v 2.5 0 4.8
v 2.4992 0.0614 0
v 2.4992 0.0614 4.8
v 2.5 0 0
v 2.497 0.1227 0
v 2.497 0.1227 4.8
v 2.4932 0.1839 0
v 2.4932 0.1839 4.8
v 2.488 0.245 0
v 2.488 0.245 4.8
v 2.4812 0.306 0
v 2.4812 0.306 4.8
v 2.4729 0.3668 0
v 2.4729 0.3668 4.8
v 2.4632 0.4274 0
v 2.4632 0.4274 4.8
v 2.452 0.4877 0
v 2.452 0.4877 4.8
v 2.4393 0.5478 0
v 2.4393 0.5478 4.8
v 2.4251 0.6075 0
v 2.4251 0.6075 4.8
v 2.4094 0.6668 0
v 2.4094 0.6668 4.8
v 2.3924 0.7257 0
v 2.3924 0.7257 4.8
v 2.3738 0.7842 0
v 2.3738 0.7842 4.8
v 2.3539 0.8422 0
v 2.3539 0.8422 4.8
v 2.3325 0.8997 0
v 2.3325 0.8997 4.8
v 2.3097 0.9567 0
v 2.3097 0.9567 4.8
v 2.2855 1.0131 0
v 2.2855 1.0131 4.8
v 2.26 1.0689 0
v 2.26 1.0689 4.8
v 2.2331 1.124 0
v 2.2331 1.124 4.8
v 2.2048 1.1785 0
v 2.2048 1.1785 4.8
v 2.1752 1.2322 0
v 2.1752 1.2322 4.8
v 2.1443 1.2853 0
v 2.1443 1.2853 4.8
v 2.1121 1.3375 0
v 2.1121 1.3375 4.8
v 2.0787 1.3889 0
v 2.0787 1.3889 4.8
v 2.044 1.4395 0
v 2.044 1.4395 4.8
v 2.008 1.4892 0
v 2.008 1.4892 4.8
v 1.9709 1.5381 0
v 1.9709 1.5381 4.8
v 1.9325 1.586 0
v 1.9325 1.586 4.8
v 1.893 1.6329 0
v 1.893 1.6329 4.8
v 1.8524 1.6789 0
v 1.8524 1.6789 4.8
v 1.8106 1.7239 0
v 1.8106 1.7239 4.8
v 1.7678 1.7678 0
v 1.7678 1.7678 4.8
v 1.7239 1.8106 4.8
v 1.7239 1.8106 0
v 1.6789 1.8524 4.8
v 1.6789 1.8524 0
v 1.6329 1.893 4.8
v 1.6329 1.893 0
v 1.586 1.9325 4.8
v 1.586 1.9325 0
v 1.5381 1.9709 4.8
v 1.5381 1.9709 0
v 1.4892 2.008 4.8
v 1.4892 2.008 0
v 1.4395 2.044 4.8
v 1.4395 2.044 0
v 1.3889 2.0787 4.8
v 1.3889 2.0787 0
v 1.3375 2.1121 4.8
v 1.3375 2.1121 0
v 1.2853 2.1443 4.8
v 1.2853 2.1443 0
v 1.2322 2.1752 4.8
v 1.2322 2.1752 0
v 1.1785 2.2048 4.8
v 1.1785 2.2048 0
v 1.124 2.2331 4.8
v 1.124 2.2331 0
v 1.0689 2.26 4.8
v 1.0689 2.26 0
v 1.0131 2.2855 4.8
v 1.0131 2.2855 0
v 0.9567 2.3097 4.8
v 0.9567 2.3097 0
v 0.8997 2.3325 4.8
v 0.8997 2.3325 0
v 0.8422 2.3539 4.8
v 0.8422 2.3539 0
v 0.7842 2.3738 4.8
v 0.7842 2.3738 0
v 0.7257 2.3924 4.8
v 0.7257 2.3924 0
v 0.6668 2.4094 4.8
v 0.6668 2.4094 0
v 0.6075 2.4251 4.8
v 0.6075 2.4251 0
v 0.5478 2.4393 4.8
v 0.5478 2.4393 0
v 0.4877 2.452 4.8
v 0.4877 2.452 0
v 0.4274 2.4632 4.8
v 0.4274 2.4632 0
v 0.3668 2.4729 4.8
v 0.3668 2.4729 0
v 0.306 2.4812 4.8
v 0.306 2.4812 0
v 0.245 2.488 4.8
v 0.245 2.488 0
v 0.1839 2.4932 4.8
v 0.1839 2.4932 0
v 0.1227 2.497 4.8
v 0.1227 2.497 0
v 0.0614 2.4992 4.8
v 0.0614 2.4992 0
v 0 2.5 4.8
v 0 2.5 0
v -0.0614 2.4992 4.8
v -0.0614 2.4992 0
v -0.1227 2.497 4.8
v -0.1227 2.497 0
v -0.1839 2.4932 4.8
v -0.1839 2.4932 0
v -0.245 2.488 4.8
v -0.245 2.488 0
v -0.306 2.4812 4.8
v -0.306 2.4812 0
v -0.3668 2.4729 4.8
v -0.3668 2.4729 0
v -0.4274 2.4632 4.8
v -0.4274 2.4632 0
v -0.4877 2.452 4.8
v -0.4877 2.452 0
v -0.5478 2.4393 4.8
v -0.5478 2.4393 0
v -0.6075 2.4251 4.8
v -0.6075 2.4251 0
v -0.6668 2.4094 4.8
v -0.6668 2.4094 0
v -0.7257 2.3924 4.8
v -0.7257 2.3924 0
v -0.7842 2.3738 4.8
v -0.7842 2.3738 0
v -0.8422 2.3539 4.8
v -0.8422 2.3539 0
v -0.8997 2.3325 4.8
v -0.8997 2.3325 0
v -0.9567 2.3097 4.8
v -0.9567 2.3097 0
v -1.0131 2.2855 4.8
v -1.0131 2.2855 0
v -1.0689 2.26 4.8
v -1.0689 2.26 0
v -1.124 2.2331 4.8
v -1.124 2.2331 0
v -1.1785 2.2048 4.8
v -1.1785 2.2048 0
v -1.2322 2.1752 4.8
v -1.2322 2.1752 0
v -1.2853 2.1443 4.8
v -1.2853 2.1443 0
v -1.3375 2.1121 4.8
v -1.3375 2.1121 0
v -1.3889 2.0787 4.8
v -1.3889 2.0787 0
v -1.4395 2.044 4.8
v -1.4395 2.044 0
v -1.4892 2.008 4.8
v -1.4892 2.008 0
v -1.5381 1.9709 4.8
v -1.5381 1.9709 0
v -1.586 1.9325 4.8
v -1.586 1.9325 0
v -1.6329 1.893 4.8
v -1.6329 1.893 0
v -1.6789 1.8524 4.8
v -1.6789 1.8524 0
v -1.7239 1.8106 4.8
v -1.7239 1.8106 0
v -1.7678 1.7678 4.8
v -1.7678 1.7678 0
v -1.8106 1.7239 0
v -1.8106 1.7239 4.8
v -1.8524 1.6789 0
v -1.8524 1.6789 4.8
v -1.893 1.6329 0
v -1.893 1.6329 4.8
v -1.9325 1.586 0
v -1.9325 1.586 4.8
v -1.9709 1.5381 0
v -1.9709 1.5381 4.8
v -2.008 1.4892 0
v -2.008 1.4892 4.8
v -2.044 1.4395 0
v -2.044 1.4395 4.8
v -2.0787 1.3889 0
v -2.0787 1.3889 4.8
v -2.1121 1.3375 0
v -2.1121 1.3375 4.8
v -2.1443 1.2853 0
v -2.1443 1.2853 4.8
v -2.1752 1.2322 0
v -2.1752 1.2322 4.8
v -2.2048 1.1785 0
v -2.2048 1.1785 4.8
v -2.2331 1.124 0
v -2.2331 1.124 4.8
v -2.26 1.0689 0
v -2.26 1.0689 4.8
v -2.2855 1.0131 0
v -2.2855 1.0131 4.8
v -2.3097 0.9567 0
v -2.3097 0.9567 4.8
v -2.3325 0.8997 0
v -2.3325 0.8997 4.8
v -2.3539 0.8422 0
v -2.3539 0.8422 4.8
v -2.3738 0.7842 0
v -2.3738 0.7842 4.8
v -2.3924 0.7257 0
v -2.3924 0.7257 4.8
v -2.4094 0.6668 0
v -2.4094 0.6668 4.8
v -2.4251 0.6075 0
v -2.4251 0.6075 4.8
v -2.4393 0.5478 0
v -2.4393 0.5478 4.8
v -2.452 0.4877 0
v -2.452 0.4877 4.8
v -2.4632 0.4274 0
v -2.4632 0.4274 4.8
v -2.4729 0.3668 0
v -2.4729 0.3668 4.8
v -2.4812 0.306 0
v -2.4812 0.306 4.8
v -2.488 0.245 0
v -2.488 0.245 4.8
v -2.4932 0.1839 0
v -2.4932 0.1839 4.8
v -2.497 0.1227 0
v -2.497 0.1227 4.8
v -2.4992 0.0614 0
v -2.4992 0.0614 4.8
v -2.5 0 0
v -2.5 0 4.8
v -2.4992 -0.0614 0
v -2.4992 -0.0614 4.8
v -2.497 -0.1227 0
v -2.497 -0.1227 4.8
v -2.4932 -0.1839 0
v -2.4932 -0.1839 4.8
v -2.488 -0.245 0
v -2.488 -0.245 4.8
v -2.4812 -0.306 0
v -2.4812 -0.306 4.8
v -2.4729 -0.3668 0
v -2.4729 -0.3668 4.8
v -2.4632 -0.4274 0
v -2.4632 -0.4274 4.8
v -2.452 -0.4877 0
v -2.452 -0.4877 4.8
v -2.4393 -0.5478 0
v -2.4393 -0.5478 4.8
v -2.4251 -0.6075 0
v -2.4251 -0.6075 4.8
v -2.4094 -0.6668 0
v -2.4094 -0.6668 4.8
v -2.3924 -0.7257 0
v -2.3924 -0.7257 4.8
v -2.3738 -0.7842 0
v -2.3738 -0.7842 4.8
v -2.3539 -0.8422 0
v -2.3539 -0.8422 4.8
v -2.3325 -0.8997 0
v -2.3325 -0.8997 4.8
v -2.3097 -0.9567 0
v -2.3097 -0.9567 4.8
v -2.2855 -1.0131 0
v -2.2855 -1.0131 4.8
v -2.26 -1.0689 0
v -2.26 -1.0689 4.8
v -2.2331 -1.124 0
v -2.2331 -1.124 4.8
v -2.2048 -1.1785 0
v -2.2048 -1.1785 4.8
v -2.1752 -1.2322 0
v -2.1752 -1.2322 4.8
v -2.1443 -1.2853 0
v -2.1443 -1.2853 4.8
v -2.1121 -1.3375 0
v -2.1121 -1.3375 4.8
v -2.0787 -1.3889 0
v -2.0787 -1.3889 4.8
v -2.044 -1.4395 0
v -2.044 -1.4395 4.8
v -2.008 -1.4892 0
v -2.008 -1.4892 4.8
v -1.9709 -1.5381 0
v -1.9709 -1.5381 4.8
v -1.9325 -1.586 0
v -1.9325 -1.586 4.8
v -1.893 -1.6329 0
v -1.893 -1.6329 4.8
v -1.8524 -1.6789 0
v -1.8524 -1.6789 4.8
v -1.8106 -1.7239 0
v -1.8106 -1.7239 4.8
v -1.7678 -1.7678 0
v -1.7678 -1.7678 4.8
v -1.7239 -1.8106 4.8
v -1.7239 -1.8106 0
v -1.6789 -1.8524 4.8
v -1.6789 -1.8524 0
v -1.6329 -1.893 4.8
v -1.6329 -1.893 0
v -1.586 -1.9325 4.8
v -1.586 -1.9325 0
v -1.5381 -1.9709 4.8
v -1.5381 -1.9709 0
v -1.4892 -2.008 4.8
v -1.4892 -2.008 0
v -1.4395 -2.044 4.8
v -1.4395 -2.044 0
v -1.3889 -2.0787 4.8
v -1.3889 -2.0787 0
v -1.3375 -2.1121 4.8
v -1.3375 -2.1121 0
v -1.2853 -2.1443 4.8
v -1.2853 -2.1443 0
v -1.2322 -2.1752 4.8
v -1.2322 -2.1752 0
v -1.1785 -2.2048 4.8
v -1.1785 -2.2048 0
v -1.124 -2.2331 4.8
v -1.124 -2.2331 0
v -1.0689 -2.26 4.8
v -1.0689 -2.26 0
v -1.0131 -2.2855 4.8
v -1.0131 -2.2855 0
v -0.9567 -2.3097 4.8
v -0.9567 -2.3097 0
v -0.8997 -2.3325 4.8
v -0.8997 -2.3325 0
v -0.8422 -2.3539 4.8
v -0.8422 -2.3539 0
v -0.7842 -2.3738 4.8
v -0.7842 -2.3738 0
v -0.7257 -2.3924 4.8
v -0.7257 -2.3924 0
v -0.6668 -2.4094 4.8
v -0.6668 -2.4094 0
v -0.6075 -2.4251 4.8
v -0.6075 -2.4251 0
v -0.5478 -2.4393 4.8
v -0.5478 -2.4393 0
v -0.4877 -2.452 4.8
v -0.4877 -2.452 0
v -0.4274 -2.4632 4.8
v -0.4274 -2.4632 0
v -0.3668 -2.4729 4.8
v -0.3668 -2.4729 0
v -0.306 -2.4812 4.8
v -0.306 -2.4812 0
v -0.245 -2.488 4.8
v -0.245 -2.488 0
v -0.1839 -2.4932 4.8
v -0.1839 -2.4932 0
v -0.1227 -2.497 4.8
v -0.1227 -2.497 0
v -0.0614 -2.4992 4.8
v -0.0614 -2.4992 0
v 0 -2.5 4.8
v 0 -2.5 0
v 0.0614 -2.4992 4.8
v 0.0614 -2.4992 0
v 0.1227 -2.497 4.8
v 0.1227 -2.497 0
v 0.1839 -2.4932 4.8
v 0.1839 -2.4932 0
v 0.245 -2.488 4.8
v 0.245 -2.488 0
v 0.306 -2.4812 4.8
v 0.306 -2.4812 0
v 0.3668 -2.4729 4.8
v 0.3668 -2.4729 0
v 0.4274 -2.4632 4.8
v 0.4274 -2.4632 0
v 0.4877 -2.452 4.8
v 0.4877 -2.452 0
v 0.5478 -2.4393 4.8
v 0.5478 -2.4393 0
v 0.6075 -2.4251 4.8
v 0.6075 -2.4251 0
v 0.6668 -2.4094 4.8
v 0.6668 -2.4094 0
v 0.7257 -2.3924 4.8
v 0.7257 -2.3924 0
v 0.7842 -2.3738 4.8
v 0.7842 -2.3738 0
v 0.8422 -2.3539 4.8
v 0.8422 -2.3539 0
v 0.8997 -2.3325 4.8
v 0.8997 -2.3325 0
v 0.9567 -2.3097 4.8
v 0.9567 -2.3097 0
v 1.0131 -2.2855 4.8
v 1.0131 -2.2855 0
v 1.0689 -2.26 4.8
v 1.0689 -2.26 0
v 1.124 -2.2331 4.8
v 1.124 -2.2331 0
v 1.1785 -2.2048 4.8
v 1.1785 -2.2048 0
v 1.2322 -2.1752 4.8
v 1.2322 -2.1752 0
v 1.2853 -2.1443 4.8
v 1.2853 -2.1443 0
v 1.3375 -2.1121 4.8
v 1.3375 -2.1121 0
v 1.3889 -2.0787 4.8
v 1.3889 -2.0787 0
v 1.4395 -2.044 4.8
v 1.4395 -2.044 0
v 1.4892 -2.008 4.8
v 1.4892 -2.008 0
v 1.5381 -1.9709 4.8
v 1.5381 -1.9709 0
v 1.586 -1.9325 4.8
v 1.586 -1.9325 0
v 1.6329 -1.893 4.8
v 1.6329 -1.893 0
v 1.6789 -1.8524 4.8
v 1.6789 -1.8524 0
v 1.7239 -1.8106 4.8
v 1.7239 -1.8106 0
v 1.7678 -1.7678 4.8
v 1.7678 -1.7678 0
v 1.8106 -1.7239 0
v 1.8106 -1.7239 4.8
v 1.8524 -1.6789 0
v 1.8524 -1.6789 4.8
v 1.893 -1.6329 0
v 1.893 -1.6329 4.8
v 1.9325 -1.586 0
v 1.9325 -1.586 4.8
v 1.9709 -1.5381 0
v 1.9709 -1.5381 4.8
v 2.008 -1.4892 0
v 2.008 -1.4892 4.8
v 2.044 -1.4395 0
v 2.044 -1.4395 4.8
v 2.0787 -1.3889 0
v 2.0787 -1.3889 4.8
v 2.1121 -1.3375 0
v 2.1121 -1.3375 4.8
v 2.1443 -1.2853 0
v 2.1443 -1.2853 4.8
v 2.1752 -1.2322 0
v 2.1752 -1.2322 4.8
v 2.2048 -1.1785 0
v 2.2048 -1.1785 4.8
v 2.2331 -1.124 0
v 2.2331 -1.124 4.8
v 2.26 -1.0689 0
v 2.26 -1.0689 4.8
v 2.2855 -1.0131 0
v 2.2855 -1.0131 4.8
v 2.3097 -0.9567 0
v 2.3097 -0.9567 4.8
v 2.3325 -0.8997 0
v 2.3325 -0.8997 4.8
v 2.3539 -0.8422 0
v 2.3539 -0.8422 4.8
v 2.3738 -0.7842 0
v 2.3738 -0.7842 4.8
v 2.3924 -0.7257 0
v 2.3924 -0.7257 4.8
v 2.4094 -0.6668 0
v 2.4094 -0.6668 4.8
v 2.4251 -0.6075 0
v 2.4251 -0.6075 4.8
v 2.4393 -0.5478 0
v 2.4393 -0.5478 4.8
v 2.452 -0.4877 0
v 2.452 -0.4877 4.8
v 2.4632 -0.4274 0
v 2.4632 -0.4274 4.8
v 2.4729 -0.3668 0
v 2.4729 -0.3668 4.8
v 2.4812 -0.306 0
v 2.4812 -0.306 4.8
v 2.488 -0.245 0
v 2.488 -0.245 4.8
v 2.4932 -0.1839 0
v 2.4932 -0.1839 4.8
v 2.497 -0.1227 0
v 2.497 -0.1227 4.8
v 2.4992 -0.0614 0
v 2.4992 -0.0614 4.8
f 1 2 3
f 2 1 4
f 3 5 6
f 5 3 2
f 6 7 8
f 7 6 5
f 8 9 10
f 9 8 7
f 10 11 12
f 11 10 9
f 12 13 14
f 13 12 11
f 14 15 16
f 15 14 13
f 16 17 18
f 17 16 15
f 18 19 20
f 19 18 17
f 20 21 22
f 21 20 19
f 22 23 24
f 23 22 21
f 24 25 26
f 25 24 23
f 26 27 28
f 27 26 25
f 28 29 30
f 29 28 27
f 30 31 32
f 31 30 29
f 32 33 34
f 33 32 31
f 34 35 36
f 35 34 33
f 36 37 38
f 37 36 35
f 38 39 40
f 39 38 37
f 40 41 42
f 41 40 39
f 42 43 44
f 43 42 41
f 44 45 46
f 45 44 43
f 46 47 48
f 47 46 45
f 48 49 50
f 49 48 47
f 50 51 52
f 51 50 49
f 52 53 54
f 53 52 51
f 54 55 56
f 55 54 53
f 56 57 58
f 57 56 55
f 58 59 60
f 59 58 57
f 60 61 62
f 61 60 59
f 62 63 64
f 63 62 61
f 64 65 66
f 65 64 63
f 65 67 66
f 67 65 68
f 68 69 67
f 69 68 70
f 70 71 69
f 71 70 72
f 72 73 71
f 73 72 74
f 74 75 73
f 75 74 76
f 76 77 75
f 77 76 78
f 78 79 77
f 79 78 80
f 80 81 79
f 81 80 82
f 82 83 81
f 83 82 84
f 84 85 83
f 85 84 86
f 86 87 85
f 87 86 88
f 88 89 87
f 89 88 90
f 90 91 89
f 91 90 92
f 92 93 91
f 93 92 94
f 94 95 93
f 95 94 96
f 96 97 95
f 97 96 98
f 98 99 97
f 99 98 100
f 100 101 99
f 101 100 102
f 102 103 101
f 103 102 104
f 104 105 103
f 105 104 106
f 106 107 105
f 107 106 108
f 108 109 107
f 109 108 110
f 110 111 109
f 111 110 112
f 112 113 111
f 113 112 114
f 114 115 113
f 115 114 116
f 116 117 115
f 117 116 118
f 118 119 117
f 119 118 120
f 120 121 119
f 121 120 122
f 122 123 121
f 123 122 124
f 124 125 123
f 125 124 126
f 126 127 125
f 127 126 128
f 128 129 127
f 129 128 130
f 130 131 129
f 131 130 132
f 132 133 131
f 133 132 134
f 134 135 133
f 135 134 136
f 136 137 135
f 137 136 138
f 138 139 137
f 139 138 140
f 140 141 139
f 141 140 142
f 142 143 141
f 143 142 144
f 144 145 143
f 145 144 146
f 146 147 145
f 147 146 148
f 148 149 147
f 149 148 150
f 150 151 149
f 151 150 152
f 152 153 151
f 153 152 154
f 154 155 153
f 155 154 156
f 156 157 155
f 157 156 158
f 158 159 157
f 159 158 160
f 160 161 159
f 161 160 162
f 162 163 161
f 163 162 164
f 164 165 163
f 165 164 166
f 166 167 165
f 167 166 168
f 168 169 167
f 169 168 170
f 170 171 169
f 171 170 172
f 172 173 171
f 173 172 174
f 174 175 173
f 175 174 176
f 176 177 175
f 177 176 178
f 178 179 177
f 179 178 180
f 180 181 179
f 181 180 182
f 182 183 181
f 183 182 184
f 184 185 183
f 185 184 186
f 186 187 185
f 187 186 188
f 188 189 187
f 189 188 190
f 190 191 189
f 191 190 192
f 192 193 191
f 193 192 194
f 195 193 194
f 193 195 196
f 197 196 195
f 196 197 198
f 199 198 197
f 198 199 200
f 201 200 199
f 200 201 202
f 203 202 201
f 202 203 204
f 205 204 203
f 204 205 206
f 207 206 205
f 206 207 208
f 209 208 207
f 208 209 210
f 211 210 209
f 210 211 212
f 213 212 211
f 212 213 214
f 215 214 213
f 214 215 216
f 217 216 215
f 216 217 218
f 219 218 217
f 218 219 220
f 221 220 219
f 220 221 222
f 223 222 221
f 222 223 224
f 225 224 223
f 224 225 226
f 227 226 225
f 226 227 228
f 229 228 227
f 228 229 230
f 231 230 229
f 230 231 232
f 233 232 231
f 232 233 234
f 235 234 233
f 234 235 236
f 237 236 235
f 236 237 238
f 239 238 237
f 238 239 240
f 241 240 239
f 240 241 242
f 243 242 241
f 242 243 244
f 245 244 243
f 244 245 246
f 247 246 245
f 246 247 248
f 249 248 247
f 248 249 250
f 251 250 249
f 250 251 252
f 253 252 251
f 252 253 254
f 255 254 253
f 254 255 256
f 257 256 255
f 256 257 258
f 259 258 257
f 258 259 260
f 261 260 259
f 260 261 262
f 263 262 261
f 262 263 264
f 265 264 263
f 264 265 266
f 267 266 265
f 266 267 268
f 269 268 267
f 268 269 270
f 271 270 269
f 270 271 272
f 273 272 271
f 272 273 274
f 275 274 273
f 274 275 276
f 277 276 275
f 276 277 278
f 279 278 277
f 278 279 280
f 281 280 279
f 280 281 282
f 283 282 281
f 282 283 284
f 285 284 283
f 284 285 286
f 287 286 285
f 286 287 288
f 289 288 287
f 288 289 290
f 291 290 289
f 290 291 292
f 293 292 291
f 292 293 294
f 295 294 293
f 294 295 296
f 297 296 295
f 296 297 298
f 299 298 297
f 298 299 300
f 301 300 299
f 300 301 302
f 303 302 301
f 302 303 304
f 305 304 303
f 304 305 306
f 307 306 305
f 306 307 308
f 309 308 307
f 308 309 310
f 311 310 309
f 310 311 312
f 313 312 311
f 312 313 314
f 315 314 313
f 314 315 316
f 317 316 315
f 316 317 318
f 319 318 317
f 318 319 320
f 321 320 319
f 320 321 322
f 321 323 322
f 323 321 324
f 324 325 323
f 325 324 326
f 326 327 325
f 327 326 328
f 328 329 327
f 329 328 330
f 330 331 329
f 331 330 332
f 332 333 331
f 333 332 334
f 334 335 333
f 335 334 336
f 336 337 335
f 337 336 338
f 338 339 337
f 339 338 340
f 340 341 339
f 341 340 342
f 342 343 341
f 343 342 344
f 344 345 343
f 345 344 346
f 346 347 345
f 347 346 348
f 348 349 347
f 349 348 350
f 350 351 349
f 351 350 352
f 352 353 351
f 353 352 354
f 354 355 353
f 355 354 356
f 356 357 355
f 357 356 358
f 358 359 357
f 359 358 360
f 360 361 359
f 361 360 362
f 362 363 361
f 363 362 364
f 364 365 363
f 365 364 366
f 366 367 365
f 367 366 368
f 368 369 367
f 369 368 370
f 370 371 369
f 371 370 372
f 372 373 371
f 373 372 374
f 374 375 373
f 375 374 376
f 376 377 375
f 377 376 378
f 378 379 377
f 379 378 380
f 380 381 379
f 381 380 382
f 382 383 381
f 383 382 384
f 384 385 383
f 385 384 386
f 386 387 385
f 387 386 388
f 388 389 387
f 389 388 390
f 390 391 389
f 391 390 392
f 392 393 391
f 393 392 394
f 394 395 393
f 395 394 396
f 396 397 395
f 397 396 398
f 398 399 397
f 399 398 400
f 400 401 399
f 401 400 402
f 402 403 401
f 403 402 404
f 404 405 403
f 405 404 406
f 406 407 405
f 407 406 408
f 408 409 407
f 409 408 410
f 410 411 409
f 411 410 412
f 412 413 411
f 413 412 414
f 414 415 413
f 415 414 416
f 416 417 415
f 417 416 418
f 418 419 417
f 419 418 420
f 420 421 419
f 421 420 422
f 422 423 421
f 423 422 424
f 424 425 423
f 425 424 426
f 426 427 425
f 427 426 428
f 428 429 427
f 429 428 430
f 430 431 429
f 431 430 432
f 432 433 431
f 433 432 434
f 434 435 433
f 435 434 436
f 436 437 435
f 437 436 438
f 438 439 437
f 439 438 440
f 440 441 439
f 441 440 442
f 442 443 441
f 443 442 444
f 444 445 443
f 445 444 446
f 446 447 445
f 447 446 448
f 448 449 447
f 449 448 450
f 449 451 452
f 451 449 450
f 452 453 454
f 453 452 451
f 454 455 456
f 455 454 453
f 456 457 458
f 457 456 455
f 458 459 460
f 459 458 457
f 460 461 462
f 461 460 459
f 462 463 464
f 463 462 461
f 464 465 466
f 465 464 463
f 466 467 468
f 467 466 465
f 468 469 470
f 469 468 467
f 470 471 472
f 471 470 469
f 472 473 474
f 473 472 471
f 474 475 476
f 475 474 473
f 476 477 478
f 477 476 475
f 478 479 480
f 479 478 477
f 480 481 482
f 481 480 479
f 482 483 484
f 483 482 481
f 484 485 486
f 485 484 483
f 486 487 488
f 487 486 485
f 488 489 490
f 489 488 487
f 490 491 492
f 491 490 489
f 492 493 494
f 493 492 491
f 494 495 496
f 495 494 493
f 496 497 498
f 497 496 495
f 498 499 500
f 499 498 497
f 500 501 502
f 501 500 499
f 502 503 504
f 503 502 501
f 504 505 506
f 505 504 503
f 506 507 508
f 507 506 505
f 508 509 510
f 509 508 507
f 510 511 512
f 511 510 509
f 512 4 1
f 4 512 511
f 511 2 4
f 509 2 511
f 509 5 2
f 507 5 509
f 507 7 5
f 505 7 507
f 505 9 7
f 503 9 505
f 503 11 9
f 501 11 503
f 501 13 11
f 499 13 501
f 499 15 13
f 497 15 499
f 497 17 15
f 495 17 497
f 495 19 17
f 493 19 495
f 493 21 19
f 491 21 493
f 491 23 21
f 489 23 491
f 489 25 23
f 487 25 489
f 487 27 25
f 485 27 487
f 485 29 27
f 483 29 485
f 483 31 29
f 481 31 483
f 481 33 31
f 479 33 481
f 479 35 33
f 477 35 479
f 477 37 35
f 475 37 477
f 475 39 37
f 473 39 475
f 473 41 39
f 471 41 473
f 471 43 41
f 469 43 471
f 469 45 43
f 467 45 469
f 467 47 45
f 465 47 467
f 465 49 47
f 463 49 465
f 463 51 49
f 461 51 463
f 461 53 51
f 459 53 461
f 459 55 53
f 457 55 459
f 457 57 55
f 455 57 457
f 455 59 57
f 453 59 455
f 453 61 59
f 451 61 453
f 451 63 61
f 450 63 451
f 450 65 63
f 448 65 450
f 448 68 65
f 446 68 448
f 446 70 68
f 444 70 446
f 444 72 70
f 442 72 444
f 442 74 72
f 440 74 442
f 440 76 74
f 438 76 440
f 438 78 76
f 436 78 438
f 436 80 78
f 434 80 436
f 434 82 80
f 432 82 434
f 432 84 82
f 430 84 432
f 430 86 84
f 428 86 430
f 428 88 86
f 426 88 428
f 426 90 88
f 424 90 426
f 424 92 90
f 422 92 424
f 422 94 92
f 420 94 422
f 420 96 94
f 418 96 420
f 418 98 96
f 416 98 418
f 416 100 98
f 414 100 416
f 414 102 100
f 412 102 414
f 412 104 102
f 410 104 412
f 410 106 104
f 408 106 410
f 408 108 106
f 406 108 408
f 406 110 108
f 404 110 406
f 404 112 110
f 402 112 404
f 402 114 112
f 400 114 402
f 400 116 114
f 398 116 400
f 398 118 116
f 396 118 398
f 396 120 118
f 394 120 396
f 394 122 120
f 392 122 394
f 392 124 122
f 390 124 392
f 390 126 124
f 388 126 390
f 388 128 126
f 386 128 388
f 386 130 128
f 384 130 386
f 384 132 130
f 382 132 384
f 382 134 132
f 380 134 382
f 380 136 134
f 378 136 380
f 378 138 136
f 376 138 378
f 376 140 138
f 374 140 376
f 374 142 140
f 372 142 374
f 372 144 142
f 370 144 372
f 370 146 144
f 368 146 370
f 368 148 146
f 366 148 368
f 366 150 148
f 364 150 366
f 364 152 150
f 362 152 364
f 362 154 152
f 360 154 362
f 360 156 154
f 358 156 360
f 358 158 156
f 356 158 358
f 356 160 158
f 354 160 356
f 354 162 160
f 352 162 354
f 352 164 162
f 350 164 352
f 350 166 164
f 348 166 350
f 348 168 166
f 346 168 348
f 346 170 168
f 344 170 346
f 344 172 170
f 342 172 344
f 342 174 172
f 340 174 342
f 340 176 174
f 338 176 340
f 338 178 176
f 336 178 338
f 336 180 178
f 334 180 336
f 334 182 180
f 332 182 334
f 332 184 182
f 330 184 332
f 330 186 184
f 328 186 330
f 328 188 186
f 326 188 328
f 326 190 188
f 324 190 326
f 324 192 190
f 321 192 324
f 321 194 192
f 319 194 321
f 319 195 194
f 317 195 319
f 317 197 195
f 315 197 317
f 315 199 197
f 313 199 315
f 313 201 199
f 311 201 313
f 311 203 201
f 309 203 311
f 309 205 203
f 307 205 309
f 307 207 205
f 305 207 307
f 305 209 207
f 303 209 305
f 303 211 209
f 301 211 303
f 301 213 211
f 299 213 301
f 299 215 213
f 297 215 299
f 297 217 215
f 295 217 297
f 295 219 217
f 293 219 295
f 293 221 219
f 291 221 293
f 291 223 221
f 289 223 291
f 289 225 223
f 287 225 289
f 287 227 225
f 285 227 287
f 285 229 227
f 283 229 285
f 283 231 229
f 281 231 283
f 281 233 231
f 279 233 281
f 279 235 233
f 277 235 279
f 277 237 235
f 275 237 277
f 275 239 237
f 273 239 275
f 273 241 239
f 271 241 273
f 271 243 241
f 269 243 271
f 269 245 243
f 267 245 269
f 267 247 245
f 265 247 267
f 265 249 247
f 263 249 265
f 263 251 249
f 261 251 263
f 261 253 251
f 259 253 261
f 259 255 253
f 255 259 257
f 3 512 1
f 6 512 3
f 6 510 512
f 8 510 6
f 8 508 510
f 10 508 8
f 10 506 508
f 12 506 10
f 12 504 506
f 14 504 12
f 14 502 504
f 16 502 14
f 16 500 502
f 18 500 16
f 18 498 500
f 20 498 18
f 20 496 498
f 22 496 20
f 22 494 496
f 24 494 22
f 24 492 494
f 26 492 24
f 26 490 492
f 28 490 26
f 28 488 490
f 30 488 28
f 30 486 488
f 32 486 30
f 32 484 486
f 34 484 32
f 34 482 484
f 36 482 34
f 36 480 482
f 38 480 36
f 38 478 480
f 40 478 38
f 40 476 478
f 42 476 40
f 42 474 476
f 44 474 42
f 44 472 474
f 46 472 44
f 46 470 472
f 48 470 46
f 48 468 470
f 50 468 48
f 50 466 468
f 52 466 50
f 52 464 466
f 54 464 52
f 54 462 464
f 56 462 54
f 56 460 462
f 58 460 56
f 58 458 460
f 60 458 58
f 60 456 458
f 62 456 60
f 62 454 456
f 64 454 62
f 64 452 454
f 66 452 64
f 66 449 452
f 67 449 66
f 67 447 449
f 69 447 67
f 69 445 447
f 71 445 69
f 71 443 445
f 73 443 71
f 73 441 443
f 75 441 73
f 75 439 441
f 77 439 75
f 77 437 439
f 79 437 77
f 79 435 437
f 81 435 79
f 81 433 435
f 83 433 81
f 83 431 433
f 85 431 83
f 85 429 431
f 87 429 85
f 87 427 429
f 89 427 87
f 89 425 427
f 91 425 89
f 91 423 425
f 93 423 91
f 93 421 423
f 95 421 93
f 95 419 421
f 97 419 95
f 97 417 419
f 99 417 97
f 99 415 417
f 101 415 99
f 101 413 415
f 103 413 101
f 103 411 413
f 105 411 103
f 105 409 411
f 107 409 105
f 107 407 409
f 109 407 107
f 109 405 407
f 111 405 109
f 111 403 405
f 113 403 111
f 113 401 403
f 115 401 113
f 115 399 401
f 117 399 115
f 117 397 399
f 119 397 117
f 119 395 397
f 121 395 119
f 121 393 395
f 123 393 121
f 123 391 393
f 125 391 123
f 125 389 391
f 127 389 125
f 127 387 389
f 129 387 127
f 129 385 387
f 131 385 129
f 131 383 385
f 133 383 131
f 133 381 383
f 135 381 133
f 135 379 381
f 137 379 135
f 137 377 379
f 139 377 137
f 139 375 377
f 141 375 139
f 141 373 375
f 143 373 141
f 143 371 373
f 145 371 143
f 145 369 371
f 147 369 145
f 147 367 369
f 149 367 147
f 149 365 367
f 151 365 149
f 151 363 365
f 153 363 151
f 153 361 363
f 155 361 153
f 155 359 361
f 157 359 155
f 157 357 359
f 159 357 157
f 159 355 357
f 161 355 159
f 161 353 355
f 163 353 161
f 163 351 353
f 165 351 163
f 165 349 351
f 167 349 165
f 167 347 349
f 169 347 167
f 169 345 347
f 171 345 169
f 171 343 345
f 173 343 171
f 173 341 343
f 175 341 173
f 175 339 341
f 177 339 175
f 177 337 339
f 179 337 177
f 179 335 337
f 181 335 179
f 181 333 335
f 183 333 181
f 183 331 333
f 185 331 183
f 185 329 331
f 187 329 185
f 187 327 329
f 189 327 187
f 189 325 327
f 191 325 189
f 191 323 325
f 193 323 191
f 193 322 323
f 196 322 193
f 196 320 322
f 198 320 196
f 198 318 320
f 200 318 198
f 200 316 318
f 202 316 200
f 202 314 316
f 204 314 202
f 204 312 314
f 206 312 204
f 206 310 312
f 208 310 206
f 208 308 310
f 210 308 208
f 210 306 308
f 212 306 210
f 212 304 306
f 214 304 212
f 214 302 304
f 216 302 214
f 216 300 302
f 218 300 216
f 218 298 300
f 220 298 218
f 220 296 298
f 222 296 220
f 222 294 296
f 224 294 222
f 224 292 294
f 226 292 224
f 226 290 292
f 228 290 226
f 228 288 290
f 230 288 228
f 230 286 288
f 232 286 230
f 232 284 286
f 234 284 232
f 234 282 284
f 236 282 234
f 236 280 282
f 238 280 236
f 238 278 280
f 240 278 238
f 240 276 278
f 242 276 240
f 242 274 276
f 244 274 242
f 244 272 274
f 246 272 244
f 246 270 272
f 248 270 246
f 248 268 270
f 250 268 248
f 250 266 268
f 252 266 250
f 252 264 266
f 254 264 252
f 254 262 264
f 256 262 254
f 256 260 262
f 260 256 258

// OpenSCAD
$fn=256;

// z = depth
// x = wdith
// y = length

nozzelDiameter = 0.4;
wallThickness = nozzelDiameter * 6;

inchesToMmRatio = 25.4;

wellRadius = 5;

totalLength = (11.5 * inchesToMmRatio) / 2;

// totalLength = (11.5 / 4) * inchesToMmRatio;

totalWidth = 2.5 * inchesToMmRatio;
totalHeight = 1.5 * inchesToMmRatio;

slopeDepth = 0.5 * inchesToMmRatio;
slopeHeight = totalHeight;

numberOfCells = 2;
numberOfWalls = numberOfCells + 1;
numberOfSeperatorWalls = numberOfWalls - 2;

cellWidth = totalWidth - 2 * wallThickness;
cellLength = (totalLength - (numberOfWalls * wallThickness)) / numberOfCells;

module prusamain() {
    difference() {
        union(){
            trayFloor();
            perimeter();
            wellFillet(wellRadius);
            dividerWalls();
            wellFillet2();
        }
        pinHoles();
    }
}


module dividerWalls() {
    for (i = [1:numberOfSeperatorWalls]) {
        yOffset = wallThickness + (i * cellLength);
        translate([ 0, yOffset, 0]) {
            widthWall();
        } 
    }
}

pin();

pinDiameter = 5;
pinHeight = 2 * wallThickness;
pinOffset= 2 * pinDiameter;

module pin() {
  cylinder(h = pinHeight, r = (pinDiameter / 2));
}

module pinHoles() {

    translate(v = [pinOffset, wallThickness + 1, pinOffset]) {
        pinHole();
    }


    translate(v = [totalWidth - pinOffset, wallThickness + 1, totalHeight - pinOffset]) {
        pinHole();
    }

}

module pinHole() {
    rotate([90,0,0]) { 
    cylinder(h = wallThickness + 2, r = ((pinDiameter + 1) / 2));
    }
}


module wellFillet(r=10) {
    translate([0,totalLength / 2, 0])  {
        rotate([90,0,0]) {
            filletEdge(totalLength, r, wallThickness);
        } 
    }
}


module wellFillet2() {
    translate([totalWidth, 0,0]) { 
        mirror([1,0,0]) {

            translate([0,totalLength / 2, 0])  {
                rotate([90,0,0]) {
                    filletEdge2(
                        l = totalLength,
                        r = slopeDepth,
                        w = wallThickness,
                        h = totalHeight
                    );
                }
            }
        }
    }
}



module filletEdge(l = 10, r = 2, w = 1) {

    cubeSide = r + w;

    translate([w, w, 0]) {
        
        difference() {
            
            translate([cubeSide / 2 - w, cubeSide / 2  - w, 0]) {
                cube(size=[cubeSide, cubeSide, l], center=true);
            }

            translate([r, r, 0]) {
                cylinder(l, r, r, true);   
            }

        }


    }
}

// l = length
// r = radius
// w = wall thickess (top and bottom)
// h = height
module filletEdge2(l = 10, r = 2, w = 1, h= 2) {

    postiveBodyWidth = r + w;
    postiveBodyHeight = h ;

    translate([w, w, 0]) {
        
        difference() {
            
            translate([postiveBodyWidth / 2 - w, postiveBodyHeight / 2  - w, 0]) {
                cube(size=[postiveBodyWidth, postiveBodyHeight, l], center=true);
            }

            translate([r, h, 0]) {
                resize([0,h*2,0], false)  {
                    cylinder(l, r, r, true);   
                }
            }

        }

    }
}





module perimeter() {

    lengthWall();

    translate([totalWidth - wallThickness, 0, 0])  {
        lengthWall();
    }

    widthWall();

    translate([0, totalLength- wallThickness, 0])  {
        widthWall();
    }

}


// floor
module trayFloor() {

    linear_extrude(height = wallThickness) {
        polygon(
            points = [[0,0], [0,totalLength], [totalWidth, totalLength], [totalWidth, 0]]
        );
    }
}



// perimeter

module widthWall() {
    linear_extrude(height = totalHeight) {
        polygon(
            points = [[0,0], [totalWidth,0], [totalWidth, wallThickness], [0, wallThickness]]
        );
    }
}

module lengthWall() {
    linear_extrude(height = totalHeight) {
        polygon(
            points = [[0,0], [0,totalLength], [wallThickness, totalLength], [wallThickness, 0]]
        );
    }
}
